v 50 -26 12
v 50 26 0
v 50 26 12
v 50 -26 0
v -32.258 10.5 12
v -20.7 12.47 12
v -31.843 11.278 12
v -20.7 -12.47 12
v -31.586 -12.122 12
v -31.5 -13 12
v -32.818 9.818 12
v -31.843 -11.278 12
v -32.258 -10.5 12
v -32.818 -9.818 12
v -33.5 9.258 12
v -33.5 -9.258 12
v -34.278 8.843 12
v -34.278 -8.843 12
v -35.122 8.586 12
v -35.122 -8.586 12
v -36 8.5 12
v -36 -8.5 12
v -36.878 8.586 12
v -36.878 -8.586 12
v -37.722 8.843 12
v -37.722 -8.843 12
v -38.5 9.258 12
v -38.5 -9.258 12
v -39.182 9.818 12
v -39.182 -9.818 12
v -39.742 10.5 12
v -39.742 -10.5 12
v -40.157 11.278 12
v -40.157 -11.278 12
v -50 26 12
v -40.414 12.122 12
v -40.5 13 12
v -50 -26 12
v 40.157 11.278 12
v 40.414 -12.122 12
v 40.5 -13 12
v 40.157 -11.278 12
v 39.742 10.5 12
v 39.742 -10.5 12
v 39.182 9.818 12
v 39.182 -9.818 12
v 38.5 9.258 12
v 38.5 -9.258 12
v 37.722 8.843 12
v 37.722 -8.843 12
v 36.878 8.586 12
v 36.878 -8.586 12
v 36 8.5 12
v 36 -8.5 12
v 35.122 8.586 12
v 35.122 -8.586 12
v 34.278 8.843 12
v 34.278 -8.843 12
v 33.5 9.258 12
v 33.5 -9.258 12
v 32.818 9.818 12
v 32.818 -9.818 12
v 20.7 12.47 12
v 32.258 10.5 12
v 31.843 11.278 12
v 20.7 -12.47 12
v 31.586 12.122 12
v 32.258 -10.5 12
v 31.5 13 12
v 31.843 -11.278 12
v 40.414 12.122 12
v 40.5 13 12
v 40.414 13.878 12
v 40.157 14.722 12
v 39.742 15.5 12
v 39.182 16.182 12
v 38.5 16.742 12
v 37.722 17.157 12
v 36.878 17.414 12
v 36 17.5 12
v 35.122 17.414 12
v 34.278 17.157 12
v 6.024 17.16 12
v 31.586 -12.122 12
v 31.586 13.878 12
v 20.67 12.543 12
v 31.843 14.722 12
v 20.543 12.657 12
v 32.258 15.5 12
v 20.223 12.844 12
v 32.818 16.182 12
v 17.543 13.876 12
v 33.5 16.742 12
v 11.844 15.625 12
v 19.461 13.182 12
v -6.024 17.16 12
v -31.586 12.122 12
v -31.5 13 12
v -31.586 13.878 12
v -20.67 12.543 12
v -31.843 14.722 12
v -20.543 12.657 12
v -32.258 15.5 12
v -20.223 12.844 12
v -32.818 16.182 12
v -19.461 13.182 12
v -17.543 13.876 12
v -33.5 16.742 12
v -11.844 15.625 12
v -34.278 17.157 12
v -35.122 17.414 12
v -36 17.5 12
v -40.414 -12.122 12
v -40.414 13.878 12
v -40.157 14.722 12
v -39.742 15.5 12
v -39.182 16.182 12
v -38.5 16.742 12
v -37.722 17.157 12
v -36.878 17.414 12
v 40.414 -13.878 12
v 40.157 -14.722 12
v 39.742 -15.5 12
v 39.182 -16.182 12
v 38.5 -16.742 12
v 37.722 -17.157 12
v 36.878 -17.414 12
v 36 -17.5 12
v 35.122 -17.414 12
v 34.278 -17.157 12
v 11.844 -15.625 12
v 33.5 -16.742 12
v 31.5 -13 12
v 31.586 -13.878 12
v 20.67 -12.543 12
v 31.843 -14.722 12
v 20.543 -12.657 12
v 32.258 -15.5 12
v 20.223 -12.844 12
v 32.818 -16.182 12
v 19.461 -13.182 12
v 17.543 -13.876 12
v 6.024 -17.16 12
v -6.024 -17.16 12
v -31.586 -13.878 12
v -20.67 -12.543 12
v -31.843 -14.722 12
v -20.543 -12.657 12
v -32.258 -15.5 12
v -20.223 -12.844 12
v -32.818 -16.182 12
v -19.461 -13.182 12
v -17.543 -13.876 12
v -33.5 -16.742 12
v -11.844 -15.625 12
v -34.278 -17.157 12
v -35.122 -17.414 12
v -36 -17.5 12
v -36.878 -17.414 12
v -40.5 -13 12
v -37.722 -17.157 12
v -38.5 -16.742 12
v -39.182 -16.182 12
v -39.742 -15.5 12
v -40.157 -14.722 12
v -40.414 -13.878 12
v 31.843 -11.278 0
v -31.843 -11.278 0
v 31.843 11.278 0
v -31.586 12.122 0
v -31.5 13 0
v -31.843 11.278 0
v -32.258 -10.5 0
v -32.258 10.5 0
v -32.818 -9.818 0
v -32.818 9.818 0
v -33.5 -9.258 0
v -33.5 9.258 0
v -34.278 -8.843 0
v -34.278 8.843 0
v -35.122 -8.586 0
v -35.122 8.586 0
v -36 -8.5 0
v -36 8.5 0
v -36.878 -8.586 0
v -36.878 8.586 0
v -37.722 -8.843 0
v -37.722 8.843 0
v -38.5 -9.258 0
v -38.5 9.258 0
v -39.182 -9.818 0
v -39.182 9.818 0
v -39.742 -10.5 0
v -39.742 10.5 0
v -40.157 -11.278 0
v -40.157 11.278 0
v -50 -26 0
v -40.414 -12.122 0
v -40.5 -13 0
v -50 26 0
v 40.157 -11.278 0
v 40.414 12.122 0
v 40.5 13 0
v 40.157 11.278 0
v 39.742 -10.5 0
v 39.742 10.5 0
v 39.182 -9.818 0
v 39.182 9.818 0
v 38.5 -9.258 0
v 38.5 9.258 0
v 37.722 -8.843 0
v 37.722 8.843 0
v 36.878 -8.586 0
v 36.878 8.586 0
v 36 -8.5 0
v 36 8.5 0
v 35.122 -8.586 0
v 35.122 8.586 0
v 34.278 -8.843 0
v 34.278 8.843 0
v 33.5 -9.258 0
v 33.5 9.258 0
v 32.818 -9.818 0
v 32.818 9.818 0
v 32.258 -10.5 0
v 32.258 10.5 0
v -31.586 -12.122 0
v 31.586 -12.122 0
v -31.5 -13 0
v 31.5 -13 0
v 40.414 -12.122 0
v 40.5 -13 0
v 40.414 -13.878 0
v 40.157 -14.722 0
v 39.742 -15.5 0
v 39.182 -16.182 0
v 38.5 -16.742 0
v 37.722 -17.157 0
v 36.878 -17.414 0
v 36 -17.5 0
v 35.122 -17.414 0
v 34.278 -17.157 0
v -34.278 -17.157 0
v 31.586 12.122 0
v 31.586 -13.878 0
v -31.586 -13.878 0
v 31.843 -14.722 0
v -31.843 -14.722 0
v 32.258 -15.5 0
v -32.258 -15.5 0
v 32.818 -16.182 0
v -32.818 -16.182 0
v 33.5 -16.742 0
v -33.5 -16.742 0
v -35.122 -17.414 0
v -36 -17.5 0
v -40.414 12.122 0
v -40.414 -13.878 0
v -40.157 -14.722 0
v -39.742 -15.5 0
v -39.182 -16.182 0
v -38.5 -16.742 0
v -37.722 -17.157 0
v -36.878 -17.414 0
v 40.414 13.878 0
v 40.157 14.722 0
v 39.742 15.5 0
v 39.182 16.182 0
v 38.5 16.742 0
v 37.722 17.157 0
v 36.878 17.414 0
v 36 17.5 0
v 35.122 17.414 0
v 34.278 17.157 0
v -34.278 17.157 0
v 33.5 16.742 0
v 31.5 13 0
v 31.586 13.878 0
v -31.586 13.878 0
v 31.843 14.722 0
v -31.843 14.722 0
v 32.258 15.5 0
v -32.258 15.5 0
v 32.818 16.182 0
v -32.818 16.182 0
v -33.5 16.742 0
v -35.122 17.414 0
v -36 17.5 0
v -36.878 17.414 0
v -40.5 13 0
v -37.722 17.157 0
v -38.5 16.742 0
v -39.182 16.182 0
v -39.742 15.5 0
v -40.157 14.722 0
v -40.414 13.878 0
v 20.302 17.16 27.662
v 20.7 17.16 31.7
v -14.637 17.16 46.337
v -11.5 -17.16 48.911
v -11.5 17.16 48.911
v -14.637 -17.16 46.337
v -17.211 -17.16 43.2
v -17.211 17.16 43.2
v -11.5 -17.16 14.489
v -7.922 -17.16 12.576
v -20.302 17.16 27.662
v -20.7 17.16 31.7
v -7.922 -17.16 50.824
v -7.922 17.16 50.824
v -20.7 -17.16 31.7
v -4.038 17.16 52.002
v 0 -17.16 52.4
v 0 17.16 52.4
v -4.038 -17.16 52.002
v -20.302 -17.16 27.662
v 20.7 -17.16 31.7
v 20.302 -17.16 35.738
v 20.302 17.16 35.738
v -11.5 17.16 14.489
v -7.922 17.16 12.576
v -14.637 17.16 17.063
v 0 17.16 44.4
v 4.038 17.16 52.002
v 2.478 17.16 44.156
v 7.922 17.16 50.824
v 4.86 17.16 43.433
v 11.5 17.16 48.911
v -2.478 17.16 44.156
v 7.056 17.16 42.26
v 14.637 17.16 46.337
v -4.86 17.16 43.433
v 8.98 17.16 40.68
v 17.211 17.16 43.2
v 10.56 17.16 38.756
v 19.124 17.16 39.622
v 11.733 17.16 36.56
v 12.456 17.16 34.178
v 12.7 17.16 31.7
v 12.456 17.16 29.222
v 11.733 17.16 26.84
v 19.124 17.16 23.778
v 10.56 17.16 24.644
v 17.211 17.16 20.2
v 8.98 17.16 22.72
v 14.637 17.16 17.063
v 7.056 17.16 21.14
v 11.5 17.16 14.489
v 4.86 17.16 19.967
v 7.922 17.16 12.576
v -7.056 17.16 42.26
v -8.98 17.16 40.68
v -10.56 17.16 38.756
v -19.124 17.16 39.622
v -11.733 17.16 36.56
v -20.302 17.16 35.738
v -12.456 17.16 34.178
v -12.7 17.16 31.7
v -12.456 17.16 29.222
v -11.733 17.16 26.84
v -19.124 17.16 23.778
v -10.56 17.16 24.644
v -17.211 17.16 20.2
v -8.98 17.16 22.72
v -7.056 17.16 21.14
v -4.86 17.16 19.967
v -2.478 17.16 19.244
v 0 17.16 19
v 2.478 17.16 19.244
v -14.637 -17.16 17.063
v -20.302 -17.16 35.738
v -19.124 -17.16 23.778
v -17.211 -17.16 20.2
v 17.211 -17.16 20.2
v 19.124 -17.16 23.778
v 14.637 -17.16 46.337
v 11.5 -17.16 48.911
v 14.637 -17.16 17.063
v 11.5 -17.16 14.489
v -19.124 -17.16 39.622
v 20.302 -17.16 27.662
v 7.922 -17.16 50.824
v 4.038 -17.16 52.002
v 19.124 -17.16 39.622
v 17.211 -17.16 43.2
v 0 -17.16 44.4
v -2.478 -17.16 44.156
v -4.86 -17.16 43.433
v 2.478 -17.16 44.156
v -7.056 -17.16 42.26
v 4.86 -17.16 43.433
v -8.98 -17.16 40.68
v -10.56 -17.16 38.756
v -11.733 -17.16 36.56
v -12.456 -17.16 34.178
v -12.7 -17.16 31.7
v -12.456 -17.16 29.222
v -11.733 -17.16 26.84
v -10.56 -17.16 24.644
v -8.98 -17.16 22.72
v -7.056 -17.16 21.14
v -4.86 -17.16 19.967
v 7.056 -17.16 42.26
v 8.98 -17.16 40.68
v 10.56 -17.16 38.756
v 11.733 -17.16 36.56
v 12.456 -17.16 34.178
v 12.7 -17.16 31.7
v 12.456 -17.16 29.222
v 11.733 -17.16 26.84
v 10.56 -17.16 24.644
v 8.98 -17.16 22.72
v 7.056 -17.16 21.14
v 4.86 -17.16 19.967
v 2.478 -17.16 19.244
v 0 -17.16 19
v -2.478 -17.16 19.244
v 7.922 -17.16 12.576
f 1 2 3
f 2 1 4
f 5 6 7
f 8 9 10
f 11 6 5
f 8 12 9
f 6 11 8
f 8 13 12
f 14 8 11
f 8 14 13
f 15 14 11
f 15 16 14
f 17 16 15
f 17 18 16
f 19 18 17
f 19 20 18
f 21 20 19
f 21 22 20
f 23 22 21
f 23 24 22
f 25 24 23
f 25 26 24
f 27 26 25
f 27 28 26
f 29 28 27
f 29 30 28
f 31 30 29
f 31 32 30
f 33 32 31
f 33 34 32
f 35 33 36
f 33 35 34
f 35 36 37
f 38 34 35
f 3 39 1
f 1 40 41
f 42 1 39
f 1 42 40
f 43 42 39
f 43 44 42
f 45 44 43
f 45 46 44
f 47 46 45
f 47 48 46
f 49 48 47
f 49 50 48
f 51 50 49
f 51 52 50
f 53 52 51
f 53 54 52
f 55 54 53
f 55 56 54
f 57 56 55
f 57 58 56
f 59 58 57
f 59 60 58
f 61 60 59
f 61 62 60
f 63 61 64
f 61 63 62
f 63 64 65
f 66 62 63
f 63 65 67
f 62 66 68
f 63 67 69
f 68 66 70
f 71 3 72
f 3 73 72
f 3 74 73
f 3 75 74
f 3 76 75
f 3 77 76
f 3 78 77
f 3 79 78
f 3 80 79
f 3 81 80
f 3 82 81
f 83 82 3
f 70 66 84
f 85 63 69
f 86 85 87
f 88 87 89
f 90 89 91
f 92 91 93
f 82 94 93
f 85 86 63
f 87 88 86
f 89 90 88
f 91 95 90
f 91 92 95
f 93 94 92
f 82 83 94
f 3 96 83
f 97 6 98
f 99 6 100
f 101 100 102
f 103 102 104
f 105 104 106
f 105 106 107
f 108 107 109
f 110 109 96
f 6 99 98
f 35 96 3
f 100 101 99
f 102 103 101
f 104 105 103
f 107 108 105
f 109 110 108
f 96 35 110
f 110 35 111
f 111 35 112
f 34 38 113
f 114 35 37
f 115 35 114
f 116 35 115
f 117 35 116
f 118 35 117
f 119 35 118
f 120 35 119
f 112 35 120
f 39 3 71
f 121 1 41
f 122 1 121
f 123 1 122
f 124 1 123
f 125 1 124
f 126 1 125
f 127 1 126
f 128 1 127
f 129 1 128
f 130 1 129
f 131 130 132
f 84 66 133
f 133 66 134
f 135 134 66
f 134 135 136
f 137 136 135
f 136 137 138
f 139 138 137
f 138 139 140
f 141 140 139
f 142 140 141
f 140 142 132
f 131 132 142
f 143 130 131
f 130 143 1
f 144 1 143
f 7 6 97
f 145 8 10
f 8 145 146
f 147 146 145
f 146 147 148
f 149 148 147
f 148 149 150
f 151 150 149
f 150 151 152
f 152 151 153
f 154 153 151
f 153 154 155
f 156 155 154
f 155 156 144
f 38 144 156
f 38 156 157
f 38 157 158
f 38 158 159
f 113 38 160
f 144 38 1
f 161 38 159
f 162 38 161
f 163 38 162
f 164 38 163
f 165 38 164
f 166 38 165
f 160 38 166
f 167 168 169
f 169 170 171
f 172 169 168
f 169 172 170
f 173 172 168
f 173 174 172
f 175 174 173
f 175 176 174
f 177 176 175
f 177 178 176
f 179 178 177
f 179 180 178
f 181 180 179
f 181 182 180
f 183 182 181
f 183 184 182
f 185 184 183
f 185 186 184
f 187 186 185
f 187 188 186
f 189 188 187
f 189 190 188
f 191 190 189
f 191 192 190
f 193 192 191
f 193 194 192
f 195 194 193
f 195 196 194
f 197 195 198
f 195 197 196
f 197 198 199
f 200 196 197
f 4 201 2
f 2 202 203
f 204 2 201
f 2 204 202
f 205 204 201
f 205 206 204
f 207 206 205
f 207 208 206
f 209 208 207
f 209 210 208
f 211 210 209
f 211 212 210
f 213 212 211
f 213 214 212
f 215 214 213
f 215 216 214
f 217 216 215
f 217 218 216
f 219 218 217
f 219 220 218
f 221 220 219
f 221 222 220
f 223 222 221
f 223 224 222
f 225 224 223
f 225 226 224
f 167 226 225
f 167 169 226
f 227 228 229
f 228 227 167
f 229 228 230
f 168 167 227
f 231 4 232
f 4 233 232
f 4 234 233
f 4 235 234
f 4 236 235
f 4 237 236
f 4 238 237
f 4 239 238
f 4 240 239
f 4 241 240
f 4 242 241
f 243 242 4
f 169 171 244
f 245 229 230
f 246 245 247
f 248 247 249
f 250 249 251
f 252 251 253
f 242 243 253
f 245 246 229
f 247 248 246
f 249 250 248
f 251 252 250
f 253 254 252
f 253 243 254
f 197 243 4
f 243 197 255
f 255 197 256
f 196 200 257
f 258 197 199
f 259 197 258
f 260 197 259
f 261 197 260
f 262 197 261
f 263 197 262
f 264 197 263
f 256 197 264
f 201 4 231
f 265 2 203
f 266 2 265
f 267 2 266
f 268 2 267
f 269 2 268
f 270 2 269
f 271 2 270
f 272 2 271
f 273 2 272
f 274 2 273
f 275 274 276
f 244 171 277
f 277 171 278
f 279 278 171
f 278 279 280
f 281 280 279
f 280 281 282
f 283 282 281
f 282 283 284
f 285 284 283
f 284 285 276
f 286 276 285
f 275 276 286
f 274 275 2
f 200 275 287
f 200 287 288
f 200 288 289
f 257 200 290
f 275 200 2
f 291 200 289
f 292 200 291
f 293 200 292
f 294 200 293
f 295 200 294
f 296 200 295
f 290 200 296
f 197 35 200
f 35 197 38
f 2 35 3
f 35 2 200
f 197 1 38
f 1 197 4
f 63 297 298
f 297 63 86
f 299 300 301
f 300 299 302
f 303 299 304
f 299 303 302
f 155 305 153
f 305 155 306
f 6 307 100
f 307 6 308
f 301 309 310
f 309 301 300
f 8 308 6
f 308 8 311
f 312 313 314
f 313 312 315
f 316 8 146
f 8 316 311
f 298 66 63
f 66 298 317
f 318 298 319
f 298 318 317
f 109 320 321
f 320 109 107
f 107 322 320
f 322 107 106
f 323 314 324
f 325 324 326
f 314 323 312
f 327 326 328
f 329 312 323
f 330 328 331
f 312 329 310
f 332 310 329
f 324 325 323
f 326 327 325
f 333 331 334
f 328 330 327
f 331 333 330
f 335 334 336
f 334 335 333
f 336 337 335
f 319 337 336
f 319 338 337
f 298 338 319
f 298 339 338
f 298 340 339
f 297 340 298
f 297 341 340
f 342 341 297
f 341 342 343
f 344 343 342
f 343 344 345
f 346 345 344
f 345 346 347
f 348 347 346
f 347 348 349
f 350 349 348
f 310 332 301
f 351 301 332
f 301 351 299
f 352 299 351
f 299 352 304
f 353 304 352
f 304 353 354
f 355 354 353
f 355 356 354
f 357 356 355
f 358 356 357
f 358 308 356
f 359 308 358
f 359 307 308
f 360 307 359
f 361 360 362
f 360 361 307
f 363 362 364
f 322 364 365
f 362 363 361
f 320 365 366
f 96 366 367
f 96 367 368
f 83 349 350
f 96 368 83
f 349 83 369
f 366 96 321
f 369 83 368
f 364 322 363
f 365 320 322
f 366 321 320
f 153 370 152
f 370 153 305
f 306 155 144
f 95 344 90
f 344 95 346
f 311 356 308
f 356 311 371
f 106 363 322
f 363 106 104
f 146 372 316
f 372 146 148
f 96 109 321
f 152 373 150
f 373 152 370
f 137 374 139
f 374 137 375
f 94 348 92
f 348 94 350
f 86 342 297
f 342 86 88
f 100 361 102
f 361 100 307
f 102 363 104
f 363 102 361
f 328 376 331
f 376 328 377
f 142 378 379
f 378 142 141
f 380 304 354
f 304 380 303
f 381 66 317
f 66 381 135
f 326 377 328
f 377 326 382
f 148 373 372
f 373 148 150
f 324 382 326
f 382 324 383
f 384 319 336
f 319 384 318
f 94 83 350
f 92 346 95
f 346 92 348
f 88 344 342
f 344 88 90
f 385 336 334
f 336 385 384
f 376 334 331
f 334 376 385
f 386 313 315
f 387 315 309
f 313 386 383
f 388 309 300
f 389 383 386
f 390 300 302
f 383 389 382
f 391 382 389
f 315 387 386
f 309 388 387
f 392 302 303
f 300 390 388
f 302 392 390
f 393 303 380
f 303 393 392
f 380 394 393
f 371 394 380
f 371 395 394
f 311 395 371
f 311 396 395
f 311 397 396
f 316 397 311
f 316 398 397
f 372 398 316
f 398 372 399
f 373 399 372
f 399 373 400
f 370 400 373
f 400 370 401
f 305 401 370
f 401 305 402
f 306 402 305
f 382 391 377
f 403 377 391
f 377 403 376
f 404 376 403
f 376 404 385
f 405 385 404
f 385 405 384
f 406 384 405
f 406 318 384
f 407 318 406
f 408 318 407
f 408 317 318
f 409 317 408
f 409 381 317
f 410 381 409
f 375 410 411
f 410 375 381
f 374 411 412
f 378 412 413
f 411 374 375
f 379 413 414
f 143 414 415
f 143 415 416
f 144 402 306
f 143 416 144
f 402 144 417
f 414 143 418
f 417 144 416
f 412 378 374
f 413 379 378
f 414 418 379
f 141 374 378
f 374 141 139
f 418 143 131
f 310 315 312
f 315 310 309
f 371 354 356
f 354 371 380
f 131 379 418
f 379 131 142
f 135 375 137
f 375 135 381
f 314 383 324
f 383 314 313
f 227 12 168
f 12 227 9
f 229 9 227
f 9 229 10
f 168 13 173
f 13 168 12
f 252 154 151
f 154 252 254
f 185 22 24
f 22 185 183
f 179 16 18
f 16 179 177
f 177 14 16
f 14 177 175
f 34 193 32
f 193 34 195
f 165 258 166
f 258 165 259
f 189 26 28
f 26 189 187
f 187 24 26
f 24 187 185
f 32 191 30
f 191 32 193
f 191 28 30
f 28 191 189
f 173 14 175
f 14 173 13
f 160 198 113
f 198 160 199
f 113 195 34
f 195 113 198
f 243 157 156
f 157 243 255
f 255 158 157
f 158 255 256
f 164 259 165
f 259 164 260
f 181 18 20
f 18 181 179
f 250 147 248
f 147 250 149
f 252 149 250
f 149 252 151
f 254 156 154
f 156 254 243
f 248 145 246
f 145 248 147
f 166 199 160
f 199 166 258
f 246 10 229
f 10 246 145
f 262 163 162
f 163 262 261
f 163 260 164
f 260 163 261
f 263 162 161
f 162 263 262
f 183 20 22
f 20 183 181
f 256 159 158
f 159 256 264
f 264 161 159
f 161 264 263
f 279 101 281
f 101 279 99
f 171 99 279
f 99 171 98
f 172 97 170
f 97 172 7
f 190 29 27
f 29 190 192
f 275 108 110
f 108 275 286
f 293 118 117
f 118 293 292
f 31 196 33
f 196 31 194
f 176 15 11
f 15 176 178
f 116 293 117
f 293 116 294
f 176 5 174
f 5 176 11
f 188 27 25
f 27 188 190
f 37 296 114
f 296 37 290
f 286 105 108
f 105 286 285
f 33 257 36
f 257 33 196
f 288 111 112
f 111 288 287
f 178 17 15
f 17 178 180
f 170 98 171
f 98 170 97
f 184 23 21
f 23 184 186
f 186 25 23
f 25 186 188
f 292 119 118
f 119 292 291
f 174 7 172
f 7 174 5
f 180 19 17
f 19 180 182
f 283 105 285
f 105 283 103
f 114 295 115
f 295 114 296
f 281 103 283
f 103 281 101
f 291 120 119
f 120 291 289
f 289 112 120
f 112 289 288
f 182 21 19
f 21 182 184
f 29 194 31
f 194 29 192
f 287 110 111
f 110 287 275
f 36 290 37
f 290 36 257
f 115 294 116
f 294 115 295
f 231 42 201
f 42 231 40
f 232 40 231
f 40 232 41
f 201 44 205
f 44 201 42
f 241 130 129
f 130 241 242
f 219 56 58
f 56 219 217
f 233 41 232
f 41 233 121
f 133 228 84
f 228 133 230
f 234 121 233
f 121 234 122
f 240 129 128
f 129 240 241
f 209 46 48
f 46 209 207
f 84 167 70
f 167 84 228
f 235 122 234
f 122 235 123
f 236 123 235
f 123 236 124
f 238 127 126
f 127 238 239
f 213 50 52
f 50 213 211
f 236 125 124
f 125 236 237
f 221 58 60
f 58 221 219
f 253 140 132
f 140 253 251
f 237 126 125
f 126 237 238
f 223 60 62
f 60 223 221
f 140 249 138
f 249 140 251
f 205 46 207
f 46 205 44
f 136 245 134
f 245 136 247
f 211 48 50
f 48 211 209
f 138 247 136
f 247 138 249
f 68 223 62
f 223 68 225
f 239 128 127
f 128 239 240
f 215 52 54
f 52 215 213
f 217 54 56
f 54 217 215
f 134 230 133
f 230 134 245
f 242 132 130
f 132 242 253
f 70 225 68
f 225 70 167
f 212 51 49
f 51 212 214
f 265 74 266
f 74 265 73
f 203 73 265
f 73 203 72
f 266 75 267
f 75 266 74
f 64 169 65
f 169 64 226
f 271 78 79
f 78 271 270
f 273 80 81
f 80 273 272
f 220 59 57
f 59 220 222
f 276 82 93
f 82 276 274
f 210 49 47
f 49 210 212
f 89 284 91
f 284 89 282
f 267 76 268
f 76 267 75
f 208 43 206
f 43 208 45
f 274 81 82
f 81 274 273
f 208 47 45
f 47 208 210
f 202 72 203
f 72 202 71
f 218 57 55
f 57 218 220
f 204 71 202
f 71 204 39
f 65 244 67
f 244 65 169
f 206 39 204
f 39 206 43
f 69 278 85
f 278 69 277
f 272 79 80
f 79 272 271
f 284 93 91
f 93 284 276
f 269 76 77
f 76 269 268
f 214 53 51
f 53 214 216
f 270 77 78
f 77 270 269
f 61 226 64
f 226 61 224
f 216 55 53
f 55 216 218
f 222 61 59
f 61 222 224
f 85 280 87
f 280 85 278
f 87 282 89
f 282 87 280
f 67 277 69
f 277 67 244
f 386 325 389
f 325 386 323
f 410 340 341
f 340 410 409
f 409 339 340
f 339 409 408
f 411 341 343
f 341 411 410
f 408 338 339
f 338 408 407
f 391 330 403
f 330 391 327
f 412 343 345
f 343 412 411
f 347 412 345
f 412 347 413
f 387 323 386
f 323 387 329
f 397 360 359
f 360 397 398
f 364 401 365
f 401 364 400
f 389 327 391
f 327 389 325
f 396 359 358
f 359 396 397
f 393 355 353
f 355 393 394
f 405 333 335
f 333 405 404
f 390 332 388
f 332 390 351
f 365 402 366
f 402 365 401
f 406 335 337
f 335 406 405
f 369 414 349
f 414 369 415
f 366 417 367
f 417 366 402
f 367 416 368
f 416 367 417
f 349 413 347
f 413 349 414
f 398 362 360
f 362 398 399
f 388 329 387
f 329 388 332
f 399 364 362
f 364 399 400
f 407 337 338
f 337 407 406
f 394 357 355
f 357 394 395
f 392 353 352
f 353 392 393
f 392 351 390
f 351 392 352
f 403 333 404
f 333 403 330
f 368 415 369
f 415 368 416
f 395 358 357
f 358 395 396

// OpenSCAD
$fn = 32;

// ----------------------------------------------------------------------
// Bearing block: 100 x 52 mm base, 25.4 mm bore at 31.7 mm
// ----------------------------------------------------------------------

// --- parameters (mm) ---
base_w = 100;             // base width
base_d = 52;              // base depth
base_t = 12;              // base thickness
bore_d = 25.4;            // shaft / bearing bore
house_r = 20.7;           // housing outer radius
house_len = 34.32;        // housing length along the shaft
foot_w = 41.4;            // foot width under the housing
foot_len = 24.32;         // foot length along the shaft
axis_z = 31.7;            // bore axis height above the base
holes_d = 9;              // mounting holes
hole_x = 36;              // mounting hole spacing

difference() {
  union() {
    /* base plate with its underside on z = 0 */
    translate([0, 0, base_t / 2]) cube([base_w, base_d, base_t], center = true);
    /* hull foot: a straight web blending into the round housing */
    hull() {
      translate([0, 0, base_t - 0.5]) cube([foot_w, foot_len, 1.6], center = true);
      translate([0, 0, axis_z]) rotate([-90, 0, 0]) cylinder(h = house_len, d = 2 * house_r, center = true);
    }
  }
  /* bore through the housing, 2.5 mm clear on both sides */
  translate([0, 0, axis_z]) rotate([-90, 0, 0]) cylinder(h = house_len + 5, d = bore_d, center = true);
  /* mounting holes through the base plate */
  for (hx = [-36, 36]) {
    for (hy = [-13, 13]) {
      translate([hx, hy, -2.5]) cylinder(h = base_t + 5, d = holes_d);
    }
  }
}
